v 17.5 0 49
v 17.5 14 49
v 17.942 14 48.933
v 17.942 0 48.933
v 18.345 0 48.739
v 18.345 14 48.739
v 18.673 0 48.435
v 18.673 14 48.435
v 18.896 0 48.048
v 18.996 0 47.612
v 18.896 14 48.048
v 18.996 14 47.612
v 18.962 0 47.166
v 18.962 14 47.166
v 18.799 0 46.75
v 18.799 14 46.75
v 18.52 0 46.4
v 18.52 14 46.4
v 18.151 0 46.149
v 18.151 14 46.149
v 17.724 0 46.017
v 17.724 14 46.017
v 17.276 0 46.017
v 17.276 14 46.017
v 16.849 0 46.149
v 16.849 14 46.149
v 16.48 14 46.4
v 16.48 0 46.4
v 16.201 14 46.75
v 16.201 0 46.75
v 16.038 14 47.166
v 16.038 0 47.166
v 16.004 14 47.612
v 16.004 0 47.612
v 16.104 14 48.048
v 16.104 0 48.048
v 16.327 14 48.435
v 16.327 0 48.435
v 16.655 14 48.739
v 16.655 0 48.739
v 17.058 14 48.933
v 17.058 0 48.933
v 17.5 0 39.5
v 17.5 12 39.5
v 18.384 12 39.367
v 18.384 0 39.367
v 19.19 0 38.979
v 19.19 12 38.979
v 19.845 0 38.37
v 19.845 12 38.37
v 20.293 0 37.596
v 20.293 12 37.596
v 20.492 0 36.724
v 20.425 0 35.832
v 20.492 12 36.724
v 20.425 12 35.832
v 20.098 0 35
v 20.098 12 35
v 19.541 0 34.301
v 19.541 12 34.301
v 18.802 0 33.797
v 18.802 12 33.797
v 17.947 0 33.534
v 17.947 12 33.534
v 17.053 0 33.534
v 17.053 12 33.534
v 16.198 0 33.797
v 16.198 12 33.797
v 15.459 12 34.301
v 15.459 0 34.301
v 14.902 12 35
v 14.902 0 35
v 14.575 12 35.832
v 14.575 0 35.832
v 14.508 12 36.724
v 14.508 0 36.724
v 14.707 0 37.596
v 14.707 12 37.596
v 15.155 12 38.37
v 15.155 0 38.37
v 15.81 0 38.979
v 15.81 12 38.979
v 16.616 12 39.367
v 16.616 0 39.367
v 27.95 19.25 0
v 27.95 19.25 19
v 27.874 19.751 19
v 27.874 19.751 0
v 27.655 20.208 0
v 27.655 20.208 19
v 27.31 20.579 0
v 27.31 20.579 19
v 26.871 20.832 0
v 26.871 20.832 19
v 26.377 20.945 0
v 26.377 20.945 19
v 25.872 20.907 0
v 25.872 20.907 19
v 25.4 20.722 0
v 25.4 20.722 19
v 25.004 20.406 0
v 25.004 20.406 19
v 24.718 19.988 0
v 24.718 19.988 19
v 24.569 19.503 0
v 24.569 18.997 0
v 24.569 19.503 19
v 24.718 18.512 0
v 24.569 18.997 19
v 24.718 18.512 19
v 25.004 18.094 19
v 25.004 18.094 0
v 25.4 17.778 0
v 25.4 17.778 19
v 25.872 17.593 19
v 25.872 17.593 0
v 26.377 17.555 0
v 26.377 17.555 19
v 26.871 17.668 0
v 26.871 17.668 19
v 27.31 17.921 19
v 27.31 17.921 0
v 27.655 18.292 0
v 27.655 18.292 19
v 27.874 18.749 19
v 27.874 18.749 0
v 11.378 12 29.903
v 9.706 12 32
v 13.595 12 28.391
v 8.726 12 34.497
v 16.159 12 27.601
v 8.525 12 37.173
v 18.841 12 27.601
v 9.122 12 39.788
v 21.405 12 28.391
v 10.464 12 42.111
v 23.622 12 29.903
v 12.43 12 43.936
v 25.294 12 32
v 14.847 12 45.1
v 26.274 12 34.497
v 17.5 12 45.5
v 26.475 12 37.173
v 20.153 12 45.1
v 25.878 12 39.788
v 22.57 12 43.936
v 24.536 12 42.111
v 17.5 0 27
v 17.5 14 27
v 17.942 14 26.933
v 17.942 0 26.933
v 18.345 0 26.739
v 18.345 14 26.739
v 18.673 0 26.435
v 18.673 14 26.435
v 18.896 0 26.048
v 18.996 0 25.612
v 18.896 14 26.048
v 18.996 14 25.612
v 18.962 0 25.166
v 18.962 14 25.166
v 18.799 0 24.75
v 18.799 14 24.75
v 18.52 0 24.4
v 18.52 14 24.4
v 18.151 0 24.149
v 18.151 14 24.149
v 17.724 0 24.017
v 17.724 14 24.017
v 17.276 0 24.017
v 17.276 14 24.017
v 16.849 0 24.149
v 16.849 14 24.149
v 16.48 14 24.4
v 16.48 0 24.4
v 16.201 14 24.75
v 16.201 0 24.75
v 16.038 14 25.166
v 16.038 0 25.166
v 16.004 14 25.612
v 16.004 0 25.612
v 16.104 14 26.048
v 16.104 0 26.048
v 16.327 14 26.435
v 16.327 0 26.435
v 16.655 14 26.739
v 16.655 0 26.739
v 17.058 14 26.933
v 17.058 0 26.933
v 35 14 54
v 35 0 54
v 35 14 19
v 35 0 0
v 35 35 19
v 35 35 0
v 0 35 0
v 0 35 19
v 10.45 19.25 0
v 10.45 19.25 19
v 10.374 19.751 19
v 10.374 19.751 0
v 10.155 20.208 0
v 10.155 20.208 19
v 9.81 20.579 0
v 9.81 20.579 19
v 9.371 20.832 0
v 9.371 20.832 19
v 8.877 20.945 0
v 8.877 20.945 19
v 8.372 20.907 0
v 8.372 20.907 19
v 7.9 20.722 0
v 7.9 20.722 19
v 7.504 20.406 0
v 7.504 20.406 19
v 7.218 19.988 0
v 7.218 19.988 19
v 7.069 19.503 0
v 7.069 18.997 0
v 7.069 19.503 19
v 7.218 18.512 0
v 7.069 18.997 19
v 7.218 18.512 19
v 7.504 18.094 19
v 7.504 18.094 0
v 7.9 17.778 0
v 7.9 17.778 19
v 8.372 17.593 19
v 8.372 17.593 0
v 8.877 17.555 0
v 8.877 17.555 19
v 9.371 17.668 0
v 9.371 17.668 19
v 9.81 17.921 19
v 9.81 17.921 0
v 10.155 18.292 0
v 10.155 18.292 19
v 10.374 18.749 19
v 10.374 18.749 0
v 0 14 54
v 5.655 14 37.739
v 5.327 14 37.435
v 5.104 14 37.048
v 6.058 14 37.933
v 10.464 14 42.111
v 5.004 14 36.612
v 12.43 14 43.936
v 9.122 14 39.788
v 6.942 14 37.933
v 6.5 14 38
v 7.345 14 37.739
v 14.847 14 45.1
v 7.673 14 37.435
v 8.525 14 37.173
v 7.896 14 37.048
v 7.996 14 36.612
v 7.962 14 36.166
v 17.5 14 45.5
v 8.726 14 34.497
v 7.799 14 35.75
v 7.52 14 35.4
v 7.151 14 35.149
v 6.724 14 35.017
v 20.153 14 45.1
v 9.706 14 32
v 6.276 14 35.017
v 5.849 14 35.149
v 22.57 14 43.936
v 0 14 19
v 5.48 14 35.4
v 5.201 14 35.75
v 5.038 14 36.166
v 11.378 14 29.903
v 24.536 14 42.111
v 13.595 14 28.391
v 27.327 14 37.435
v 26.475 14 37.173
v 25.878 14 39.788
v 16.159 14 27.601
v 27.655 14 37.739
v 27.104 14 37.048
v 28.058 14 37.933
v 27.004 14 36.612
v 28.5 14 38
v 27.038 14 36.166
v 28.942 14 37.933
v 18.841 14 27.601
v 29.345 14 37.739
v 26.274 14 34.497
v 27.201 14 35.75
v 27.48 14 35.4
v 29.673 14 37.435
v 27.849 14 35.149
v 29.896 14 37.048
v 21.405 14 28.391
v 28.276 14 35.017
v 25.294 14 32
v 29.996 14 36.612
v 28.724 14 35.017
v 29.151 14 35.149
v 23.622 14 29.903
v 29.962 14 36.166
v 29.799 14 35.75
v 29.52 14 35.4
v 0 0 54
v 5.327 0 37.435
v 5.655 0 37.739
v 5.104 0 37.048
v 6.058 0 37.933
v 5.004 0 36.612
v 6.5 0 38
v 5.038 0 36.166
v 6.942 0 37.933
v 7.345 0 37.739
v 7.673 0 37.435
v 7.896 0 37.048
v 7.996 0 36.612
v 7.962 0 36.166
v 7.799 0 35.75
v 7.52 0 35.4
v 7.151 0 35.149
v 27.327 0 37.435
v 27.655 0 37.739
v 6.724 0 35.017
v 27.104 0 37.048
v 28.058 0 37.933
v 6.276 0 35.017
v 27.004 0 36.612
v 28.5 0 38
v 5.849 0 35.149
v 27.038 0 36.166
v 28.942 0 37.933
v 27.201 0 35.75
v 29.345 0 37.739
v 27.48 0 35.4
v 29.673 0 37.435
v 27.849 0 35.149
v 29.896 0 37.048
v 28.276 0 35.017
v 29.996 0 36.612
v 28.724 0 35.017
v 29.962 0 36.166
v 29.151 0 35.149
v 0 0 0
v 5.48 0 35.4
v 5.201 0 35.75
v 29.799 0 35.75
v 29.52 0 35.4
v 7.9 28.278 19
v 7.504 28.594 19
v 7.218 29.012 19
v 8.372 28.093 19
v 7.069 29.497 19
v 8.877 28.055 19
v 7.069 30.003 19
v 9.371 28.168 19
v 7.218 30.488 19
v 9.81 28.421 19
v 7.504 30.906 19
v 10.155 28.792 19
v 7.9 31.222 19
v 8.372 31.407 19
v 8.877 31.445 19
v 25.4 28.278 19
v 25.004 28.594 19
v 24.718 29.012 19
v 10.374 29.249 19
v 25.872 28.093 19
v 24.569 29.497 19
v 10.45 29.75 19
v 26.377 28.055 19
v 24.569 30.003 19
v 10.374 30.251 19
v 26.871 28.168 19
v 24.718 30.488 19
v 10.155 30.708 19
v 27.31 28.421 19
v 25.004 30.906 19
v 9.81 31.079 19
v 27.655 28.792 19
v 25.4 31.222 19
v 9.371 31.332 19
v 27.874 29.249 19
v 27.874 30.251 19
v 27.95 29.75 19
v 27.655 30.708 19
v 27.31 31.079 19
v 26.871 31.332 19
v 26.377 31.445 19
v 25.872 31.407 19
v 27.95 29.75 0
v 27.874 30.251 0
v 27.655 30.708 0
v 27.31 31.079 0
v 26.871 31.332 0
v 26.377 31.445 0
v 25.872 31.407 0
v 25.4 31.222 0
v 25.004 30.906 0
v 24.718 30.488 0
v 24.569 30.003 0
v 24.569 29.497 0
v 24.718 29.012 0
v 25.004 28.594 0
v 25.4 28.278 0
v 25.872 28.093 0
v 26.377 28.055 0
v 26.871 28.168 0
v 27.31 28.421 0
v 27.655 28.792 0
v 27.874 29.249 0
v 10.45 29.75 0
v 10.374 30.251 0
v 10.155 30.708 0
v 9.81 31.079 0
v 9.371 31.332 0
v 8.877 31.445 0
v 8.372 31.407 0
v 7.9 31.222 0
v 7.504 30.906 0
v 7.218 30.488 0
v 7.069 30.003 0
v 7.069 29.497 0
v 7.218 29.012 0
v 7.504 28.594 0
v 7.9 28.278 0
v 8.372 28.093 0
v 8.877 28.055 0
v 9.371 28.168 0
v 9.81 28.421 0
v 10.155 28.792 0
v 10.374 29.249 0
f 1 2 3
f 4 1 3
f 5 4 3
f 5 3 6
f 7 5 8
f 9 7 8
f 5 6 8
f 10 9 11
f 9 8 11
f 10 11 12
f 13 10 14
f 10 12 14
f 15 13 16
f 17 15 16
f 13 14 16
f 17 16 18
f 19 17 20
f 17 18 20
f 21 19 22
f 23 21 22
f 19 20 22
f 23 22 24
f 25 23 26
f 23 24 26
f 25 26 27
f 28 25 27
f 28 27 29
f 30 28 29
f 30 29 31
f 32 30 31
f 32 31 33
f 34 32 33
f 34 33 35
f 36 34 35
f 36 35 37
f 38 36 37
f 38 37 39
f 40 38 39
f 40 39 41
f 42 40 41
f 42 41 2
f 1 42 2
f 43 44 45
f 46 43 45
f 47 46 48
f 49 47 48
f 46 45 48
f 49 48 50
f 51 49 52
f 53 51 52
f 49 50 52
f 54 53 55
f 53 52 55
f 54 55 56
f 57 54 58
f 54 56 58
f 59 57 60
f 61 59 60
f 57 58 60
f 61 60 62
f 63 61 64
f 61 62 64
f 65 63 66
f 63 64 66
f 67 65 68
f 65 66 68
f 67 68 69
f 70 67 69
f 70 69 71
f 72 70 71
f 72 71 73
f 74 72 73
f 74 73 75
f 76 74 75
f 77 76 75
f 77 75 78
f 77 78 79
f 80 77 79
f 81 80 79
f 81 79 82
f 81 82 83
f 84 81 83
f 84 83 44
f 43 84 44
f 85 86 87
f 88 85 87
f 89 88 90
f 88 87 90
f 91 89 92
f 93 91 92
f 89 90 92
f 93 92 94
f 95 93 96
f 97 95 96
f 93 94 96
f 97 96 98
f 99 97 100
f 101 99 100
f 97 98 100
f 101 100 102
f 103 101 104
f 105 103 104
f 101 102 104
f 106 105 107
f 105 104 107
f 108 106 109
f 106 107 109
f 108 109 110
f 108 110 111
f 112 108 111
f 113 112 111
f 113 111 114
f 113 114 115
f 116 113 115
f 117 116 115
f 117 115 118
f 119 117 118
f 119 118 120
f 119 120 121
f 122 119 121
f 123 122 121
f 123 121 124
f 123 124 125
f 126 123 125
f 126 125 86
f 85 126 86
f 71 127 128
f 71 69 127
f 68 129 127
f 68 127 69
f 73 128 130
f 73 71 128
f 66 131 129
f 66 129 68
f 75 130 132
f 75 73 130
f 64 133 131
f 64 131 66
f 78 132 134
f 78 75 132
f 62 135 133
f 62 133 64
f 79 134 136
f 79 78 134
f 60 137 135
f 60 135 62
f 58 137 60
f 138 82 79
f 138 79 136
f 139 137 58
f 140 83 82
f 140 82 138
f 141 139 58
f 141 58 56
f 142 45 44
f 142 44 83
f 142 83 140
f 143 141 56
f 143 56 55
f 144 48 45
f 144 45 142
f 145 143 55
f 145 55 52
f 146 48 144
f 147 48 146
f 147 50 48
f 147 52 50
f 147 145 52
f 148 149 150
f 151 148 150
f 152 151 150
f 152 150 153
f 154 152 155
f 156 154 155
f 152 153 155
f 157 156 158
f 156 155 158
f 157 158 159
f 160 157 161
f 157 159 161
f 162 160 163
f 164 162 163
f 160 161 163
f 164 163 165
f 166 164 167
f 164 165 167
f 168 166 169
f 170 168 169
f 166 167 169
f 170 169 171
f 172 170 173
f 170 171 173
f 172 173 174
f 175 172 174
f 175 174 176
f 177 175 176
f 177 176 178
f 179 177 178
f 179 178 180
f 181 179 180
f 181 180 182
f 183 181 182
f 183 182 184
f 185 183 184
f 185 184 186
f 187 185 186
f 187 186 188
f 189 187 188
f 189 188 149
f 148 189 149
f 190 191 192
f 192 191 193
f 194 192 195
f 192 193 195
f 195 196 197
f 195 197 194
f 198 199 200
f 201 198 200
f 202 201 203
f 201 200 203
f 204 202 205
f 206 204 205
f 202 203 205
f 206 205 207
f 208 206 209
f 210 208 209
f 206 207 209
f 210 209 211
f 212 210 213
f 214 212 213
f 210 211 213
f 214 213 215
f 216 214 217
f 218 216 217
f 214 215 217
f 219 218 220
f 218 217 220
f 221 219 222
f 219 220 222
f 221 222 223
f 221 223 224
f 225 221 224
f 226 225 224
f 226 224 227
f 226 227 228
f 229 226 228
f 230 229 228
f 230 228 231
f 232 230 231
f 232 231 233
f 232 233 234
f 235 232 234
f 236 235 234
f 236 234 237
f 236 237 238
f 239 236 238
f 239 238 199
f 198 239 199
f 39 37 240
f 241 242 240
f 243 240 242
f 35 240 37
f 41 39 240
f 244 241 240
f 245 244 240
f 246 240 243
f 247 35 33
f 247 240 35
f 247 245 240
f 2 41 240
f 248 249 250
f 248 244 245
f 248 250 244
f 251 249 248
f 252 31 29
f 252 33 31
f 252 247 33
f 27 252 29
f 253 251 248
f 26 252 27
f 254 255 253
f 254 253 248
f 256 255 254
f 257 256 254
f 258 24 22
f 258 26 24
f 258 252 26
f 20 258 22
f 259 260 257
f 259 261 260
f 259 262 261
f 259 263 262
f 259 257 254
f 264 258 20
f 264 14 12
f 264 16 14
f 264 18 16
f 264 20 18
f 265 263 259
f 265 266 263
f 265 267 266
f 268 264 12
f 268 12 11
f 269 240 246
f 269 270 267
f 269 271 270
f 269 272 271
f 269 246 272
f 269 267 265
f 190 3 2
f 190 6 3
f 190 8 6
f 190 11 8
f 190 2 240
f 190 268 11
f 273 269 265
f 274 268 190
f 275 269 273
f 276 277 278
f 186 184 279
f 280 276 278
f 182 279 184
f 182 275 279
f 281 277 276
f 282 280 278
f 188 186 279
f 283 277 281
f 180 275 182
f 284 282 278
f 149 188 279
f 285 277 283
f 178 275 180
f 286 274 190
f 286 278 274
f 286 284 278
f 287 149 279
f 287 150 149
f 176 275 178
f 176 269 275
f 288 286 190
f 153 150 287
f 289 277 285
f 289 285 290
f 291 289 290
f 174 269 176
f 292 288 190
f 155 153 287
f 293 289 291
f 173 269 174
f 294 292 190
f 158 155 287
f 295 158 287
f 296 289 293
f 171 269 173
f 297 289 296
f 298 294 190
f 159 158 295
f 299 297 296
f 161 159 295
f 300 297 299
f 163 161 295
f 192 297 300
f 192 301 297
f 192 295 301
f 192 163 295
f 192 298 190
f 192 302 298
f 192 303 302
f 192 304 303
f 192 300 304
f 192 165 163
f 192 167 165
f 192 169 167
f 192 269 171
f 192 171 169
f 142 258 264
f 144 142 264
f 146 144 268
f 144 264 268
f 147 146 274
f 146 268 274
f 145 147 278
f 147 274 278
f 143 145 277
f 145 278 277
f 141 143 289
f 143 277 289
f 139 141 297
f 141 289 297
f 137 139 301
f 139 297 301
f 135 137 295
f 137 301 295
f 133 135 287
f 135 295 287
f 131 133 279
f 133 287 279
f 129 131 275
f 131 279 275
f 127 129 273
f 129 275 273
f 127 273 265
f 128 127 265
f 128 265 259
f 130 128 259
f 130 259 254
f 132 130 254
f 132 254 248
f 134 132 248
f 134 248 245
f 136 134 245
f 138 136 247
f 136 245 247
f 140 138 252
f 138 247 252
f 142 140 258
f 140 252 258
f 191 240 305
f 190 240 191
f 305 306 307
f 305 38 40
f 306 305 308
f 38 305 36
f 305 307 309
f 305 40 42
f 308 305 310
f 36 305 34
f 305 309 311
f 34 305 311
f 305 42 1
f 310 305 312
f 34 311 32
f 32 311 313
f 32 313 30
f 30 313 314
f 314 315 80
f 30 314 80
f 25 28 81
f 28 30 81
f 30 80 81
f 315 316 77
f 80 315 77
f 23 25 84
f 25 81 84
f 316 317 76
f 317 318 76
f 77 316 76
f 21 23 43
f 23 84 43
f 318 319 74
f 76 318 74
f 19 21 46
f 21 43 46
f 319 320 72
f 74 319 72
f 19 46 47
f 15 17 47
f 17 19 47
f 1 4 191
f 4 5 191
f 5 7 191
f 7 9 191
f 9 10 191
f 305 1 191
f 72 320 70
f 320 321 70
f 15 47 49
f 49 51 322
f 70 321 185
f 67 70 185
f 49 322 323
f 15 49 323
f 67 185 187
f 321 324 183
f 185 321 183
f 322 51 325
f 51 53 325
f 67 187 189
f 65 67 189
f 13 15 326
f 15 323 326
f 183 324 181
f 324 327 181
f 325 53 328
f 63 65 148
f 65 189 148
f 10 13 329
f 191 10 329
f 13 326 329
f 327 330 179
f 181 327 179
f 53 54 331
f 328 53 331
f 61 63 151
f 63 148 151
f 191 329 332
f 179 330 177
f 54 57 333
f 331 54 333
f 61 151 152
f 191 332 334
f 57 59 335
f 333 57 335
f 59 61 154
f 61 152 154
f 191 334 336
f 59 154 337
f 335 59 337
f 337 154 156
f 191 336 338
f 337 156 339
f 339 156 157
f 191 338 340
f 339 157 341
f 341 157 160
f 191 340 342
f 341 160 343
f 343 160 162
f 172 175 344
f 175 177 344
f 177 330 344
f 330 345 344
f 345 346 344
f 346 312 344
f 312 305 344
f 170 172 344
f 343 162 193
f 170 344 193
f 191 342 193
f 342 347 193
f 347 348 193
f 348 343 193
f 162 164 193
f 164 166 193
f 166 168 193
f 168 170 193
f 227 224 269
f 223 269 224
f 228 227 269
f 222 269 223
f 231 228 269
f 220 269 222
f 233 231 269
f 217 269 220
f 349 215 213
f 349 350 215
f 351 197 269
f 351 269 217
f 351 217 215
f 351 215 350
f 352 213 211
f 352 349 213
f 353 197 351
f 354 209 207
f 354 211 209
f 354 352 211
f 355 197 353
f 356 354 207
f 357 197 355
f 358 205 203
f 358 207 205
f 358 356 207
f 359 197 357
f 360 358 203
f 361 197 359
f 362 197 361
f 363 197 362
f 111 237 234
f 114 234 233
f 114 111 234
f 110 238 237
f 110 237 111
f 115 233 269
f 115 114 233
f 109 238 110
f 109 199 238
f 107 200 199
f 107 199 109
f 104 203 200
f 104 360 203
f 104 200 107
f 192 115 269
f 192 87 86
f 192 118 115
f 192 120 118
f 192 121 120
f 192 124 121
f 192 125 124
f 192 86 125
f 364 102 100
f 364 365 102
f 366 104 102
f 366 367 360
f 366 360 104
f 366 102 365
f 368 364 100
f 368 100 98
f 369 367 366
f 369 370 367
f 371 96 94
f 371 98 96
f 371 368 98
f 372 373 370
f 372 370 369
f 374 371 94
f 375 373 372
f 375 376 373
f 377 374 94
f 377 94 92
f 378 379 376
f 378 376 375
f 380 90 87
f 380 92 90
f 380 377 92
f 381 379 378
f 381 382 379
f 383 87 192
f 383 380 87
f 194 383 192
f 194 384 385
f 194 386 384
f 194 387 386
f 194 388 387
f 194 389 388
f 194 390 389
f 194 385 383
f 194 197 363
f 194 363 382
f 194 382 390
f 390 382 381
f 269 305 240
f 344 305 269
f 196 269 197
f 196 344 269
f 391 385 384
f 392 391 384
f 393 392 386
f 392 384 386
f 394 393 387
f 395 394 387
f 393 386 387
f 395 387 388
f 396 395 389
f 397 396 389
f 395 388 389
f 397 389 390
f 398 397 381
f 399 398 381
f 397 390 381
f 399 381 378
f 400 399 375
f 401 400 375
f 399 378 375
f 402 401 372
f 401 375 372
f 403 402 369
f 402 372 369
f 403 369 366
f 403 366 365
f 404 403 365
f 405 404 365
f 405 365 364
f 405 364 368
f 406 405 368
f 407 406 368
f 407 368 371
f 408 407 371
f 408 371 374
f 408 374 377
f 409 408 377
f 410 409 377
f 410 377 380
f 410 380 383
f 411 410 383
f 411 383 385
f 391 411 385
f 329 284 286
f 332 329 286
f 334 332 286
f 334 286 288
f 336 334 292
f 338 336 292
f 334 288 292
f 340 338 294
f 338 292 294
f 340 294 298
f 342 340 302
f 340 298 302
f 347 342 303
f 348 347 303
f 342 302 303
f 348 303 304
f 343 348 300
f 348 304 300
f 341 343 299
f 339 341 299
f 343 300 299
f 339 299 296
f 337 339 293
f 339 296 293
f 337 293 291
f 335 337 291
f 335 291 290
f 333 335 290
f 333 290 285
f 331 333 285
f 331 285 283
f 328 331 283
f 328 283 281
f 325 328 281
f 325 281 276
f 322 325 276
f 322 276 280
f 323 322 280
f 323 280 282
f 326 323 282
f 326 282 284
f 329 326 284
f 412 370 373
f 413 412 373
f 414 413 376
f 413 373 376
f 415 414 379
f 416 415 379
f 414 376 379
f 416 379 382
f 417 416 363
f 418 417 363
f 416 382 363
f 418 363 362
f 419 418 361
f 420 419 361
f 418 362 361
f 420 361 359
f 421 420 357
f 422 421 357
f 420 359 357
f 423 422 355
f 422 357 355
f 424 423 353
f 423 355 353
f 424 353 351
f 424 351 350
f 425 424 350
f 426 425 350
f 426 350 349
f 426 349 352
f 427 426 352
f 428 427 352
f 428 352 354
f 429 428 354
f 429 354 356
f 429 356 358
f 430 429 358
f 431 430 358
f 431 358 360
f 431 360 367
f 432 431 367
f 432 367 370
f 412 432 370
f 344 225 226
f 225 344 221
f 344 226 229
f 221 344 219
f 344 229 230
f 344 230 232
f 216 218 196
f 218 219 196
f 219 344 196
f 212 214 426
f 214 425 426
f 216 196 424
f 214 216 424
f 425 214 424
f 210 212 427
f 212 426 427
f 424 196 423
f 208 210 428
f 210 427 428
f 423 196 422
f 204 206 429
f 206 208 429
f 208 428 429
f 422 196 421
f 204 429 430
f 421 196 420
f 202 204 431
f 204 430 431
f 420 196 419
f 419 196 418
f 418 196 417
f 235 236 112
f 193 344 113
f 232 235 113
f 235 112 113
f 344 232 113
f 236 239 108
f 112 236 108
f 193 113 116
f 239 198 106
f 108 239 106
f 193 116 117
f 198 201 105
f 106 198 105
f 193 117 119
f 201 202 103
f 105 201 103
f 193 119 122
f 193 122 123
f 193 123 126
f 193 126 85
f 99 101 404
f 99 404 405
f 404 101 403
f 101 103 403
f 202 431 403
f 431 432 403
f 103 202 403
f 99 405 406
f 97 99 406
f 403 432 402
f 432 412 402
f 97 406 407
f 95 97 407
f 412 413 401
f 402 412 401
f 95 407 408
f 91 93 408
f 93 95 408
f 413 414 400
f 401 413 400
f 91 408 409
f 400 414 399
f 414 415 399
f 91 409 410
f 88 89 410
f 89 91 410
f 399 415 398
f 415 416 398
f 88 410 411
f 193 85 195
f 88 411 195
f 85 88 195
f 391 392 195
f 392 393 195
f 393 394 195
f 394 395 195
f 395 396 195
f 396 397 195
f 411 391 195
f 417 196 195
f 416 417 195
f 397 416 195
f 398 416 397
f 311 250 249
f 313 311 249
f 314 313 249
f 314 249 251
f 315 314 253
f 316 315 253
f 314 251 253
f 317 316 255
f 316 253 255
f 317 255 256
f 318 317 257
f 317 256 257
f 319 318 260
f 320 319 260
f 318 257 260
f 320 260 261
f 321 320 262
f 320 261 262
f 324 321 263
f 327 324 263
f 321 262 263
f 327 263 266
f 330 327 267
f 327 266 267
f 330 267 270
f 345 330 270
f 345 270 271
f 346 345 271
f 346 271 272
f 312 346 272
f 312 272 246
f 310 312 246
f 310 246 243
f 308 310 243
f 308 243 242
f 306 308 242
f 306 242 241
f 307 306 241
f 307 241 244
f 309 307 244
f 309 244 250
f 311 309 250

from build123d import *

# Parameters (mm, degrees)
SKETCH1_W           = 35
SKETCH1_H           = 35
BOSS_EXTRUDE1_DEPTH = 19
SKETCH2_W           = 35
SKETCH2_H           = 14
BOSS_EXTRUDE2_DEPTH = 35
SKETCH3_R           = 3
CUT_EXTRUDE1_DEPTH  = 68.690472003
SKETCH4_R           = 9
CUT_EXTRUDE2_DEPTH  = 2
SKETCH6_R           = 1.5
CUT_EXTRUDE3_DEPTH  = 68.690472003
SKETCH7_R           = 1.7
CUT_EXTRUDE4_DEPTH  = 61.621778265


with BuildPart() as part:
    # Sketch1 → Boss-Extrude1 (new body)
    with BuildSketch(Plane.XY):
        with Locations((17.5, 17.5)):
            Rectangle(SKETCH1_W, SKETCH1_H)
    extrude(amount=BOSS_EXTRUDE1_DEPTH)

    # Sketch2 → Boss-Extrude2 (add)
    with BuildSketch(Plane.XY.offset(19)):
        with Locations((17.5, 7)):
            Rectangle(SKETCH2_W, SKETCH2_H)
    extrude(amount=BOSS_EXTRUDE2_DEPTH)

    # Sketch3 → Cut-Extrude1 (cut, through all)
    with BuildSketch(Plane(origin=(0, 14, 0), x_dir=(1, 0, 0), z_dir=(0, 1, 0))):
        with Locations(Location((17.5, -36.5, 0), (0, 0, 270))):
            Circle(SKETCH3_R)
    extrude(amount=-CUT_EXTRUDE1_DEPTH, mode=Mode.SUBTRACT)

    # Sketch4 → Cut-Extrude2 (cut)
    with BuildSketch(Plane(origin=(0, 14, 0), x_dir=(1, 0, 0), z_dir=(0, 1, 0))):
        with Locations(Location((17.5, -36.5, 0), (0, 0, 270))):
            Circle(SKETCH4_R)
    extrude(amount=-CUT_EXTRUDE2_DEPTH, mode=Mode.SUBTRACT)

    # Sketch6 → Cut-Extrude3 (cut, through all)
    with BuildSketch(Plane(origin=(0, 14, 0), x_dir=(1, 0, 0), z_dir=(0, 1, 0))):
        with Locations(Location((6.5, -36.5, 0), (0, 0, 270))):
            Circle(SKETCH6_R)
        with Locations(Location((17.5, -25.5, 0), (0, 0, 270))):
            Circle(SKETCH6_R)
        with Locations(Location((28.5, -36.5, 0), (0, 0, 270))):
            Circle(SKETCH6_R)
        with Locations(Location((17.5, -47.5, 0), (0, 0, 270))):
            Circle(SKETCH6_R)
    extrude(amount=-CUT_EXTRUDE3_DEPTH, mode=Mode.SUBTRACT)

    # Sketch7 → Cut-Extrude4 (cut, through all)
    with BuildSketch(Plane.XY.offset(19)):
        with Locations((8.75, 29.75)):
            Circle(SKETCH7_R)
        with Locations((26.25, 29.75)):
            Circle(SKETCH7_R)
        with Locations((8.75, 19.25)):
            Circle(SKETCH7_R)
        with Locations((26.25, 19.25)):
            Circle(SKETCH7_R)
    extrude(amount=-CUT_EXTRUDE4_DEPTH, mode=Mode.SUBTRACT)


solid = part.part
